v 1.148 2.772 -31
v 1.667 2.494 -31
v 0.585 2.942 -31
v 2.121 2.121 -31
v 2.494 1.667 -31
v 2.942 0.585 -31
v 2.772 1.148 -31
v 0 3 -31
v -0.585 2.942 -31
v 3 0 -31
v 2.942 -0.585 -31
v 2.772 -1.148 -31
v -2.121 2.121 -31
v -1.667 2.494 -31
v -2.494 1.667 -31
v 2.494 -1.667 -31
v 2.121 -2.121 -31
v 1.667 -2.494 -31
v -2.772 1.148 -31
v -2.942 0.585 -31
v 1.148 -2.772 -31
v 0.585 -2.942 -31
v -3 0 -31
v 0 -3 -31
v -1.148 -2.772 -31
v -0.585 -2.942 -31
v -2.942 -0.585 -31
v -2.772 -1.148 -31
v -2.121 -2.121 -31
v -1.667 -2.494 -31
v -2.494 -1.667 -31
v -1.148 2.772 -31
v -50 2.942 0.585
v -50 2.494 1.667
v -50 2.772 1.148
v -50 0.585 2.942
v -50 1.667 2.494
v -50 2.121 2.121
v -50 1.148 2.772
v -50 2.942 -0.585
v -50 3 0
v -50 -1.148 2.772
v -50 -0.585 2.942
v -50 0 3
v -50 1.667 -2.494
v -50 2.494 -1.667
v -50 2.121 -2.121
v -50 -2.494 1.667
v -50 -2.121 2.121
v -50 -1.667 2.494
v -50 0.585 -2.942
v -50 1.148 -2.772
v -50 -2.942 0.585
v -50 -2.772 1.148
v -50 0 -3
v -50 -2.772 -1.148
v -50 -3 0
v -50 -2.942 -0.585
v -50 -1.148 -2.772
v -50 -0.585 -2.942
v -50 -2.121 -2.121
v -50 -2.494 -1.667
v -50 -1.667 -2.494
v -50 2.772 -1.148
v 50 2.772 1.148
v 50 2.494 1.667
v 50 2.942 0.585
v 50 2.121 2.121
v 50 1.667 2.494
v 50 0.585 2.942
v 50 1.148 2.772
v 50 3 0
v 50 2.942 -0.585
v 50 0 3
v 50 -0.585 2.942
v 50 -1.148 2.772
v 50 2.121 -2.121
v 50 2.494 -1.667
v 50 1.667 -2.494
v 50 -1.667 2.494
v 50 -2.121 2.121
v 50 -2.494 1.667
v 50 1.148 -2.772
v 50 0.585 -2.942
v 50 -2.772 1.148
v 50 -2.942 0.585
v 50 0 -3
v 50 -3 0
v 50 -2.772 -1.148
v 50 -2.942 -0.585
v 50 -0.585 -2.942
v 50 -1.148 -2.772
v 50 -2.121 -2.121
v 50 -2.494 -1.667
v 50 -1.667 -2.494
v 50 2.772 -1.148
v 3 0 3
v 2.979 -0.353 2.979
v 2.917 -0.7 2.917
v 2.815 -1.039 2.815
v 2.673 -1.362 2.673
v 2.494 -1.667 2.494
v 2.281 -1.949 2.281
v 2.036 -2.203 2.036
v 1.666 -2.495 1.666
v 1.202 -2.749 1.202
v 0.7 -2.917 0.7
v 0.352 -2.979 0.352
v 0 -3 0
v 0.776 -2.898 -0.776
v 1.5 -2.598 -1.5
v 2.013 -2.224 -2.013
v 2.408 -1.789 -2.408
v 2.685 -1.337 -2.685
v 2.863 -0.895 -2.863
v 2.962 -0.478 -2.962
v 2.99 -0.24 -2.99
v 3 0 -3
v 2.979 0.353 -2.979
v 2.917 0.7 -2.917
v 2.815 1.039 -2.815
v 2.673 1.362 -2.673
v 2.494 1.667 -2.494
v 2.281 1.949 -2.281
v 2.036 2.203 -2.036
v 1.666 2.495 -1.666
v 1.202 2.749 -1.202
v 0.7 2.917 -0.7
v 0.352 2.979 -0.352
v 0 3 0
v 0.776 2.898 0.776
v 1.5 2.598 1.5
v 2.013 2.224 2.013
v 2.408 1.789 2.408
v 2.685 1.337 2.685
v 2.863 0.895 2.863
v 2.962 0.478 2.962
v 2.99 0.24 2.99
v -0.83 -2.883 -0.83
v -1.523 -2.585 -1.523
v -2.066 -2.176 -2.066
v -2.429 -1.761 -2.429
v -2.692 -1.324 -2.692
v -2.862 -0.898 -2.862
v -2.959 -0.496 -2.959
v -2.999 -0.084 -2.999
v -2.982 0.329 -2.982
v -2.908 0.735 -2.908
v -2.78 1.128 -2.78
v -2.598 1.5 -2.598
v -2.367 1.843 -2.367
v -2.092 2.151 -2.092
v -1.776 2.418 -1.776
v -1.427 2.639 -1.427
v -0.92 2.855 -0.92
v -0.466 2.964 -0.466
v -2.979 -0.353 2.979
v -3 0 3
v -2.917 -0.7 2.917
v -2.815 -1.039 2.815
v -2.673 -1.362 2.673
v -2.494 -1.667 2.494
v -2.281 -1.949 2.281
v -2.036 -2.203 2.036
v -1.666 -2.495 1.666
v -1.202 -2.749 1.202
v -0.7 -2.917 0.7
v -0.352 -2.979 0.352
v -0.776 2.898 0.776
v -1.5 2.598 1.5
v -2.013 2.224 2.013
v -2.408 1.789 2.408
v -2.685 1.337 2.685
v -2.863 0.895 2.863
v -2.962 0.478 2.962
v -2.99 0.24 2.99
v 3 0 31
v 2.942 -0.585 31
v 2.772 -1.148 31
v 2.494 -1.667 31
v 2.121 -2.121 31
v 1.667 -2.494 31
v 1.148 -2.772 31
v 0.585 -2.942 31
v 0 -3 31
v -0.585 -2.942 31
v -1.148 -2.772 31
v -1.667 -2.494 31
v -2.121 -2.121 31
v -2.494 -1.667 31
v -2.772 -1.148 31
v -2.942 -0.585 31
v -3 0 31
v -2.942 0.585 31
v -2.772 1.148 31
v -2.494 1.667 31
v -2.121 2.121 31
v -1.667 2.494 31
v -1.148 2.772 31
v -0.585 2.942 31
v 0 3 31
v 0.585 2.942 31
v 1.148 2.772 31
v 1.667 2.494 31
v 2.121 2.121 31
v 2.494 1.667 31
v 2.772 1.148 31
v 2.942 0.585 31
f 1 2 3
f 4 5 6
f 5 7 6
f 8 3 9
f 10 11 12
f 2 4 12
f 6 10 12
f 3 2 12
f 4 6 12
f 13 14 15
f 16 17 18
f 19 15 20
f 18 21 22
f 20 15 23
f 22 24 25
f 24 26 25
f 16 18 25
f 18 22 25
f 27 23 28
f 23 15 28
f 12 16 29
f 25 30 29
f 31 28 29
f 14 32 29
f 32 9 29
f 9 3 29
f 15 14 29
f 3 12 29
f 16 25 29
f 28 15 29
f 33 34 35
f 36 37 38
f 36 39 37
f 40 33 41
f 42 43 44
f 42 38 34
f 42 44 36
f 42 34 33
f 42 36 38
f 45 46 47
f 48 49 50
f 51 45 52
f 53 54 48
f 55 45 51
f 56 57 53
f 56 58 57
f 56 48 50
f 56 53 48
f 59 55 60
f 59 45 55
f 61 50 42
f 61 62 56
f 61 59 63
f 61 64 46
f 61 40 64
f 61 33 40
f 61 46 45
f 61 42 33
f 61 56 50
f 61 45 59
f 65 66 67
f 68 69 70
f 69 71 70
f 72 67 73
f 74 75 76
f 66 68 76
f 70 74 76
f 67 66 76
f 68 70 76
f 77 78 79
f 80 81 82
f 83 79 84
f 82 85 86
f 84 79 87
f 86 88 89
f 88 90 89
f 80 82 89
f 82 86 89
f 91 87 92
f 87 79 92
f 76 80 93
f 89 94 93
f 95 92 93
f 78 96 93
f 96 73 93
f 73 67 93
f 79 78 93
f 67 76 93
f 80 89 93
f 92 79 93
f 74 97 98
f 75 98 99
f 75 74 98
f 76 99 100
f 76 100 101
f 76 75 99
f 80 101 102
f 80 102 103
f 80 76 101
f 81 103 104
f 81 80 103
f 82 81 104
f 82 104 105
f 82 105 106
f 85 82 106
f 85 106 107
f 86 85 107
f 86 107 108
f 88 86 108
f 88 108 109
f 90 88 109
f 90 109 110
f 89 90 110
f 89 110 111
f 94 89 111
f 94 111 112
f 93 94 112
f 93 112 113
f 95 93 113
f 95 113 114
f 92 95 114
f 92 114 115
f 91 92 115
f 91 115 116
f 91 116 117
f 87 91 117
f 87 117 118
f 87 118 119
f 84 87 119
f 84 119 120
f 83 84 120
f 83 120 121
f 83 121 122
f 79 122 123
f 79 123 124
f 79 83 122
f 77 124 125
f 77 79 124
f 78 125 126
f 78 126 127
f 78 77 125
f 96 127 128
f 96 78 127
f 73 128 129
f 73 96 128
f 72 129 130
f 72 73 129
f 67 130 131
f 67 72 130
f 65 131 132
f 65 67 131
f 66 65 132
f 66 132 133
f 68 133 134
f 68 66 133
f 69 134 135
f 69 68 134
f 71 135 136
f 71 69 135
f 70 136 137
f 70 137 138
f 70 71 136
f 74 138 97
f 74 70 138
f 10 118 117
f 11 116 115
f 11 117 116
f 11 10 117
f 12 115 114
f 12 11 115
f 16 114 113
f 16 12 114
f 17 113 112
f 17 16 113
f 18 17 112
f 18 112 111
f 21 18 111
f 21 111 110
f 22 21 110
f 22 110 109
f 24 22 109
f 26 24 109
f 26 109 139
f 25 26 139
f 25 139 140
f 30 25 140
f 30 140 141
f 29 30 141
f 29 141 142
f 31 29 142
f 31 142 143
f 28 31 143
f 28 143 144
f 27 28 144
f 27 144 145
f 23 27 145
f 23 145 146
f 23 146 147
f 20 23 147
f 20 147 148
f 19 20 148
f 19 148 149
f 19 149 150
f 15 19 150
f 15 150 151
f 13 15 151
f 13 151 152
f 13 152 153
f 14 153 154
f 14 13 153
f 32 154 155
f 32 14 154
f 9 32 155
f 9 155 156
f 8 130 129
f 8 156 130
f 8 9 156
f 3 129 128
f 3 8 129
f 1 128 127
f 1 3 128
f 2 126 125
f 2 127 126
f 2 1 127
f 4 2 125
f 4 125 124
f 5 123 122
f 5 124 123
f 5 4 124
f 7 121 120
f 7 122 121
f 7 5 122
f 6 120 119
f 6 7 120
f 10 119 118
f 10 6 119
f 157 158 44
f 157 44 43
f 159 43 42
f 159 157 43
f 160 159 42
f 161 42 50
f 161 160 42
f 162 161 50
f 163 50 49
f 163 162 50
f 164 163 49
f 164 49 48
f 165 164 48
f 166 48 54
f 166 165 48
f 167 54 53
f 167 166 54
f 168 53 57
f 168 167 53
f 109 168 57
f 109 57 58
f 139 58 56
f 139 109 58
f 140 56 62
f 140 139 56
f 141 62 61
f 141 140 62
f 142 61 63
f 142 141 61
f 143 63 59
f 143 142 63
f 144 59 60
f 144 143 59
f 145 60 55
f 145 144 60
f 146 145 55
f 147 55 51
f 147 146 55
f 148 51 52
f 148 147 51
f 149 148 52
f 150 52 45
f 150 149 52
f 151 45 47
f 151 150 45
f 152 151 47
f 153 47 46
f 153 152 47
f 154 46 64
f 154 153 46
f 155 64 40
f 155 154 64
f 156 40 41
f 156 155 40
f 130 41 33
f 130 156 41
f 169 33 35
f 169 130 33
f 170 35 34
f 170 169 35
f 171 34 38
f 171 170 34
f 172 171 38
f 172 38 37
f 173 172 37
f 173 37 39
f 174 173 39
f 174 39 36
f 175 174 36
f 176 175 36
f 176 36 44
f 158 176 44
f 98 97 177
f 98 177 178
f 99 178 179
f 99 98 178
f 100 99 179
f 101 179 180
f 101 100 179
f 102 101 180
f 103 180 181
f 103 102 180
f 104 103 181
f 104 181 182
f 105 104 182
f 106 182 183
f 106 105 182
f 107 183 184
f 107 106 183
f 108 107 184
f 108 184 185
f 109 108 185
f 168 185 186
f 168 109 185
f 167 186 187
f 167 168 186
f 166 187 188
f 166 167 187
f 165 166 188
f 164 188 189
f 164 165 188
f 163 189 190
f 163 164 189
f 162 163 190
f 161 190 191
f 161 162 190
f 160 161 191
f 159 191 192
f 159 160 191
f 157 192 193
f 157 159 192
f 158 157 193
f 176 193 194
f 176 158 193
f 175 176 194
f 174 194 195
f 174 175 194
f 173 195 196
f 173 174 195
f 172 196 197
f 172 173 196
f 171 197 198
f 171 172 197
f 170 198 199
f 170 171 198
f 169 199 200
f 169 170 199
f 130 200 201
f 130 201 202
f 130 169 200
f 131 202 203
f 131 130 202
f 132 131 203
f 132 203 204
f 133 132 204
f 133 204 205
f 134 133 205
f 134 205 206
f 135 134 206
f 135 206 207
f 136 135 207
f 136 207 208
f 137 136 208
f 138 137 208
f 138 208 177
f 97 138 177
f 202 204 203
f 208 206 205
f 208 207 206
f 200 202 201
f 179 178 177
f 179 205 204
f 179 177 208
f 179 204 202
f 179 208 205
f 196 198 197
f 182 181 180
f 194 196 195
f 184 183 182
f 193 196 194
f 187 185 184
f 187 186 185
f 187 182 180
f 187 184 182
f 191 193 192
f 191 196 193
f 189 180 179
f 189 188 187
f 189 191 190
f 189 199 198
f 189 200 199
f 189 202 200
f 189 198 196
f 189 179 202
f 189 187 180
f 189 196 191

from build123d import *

# Parameters (mm, degrees)
SKETCH_1_W = 100
SKETCH_1_H = 3
SKETCH_2_W = 62
SKETCH_2_H = 3


with BuildPart() as part:
    # 草图1 → 旋转1 (revolve)
    with BuildSketch(Plane.XY, mode=Mode.PRIVATE) as revolve_1_sk:
        with Locations((0, 1.5)):
            Rectangle(SKETCH_1_W, SKETCH_1_H)
    revolve(revolve_1_sk.sketch.rotate(Axis((-50, 0, 0), (1, 0, 0)), 90), axis=Axis((-50, 0, 0), (1, 0, 0)))

    # 草图2 → 旋转3 (revolve)
    with BuildSketch(Plane(origin=(0, 0, 0), x_dir=(0, 0, -1), z_dir=(1, 0, 0)), mode=Mode.PRIVATE) as revolve_3_sk:
        with Locations((0, 1.5)):
            Rectangle(SKETCH_2_W, SKETCH_2_H)
    revolve(revolve_3_sk.sketch.rotate(Axis((0, 0, 31), (0, 0, -1)), 90), axis=Axis((0, 0, 31), (0, 0, -1)))


solid = part.part
